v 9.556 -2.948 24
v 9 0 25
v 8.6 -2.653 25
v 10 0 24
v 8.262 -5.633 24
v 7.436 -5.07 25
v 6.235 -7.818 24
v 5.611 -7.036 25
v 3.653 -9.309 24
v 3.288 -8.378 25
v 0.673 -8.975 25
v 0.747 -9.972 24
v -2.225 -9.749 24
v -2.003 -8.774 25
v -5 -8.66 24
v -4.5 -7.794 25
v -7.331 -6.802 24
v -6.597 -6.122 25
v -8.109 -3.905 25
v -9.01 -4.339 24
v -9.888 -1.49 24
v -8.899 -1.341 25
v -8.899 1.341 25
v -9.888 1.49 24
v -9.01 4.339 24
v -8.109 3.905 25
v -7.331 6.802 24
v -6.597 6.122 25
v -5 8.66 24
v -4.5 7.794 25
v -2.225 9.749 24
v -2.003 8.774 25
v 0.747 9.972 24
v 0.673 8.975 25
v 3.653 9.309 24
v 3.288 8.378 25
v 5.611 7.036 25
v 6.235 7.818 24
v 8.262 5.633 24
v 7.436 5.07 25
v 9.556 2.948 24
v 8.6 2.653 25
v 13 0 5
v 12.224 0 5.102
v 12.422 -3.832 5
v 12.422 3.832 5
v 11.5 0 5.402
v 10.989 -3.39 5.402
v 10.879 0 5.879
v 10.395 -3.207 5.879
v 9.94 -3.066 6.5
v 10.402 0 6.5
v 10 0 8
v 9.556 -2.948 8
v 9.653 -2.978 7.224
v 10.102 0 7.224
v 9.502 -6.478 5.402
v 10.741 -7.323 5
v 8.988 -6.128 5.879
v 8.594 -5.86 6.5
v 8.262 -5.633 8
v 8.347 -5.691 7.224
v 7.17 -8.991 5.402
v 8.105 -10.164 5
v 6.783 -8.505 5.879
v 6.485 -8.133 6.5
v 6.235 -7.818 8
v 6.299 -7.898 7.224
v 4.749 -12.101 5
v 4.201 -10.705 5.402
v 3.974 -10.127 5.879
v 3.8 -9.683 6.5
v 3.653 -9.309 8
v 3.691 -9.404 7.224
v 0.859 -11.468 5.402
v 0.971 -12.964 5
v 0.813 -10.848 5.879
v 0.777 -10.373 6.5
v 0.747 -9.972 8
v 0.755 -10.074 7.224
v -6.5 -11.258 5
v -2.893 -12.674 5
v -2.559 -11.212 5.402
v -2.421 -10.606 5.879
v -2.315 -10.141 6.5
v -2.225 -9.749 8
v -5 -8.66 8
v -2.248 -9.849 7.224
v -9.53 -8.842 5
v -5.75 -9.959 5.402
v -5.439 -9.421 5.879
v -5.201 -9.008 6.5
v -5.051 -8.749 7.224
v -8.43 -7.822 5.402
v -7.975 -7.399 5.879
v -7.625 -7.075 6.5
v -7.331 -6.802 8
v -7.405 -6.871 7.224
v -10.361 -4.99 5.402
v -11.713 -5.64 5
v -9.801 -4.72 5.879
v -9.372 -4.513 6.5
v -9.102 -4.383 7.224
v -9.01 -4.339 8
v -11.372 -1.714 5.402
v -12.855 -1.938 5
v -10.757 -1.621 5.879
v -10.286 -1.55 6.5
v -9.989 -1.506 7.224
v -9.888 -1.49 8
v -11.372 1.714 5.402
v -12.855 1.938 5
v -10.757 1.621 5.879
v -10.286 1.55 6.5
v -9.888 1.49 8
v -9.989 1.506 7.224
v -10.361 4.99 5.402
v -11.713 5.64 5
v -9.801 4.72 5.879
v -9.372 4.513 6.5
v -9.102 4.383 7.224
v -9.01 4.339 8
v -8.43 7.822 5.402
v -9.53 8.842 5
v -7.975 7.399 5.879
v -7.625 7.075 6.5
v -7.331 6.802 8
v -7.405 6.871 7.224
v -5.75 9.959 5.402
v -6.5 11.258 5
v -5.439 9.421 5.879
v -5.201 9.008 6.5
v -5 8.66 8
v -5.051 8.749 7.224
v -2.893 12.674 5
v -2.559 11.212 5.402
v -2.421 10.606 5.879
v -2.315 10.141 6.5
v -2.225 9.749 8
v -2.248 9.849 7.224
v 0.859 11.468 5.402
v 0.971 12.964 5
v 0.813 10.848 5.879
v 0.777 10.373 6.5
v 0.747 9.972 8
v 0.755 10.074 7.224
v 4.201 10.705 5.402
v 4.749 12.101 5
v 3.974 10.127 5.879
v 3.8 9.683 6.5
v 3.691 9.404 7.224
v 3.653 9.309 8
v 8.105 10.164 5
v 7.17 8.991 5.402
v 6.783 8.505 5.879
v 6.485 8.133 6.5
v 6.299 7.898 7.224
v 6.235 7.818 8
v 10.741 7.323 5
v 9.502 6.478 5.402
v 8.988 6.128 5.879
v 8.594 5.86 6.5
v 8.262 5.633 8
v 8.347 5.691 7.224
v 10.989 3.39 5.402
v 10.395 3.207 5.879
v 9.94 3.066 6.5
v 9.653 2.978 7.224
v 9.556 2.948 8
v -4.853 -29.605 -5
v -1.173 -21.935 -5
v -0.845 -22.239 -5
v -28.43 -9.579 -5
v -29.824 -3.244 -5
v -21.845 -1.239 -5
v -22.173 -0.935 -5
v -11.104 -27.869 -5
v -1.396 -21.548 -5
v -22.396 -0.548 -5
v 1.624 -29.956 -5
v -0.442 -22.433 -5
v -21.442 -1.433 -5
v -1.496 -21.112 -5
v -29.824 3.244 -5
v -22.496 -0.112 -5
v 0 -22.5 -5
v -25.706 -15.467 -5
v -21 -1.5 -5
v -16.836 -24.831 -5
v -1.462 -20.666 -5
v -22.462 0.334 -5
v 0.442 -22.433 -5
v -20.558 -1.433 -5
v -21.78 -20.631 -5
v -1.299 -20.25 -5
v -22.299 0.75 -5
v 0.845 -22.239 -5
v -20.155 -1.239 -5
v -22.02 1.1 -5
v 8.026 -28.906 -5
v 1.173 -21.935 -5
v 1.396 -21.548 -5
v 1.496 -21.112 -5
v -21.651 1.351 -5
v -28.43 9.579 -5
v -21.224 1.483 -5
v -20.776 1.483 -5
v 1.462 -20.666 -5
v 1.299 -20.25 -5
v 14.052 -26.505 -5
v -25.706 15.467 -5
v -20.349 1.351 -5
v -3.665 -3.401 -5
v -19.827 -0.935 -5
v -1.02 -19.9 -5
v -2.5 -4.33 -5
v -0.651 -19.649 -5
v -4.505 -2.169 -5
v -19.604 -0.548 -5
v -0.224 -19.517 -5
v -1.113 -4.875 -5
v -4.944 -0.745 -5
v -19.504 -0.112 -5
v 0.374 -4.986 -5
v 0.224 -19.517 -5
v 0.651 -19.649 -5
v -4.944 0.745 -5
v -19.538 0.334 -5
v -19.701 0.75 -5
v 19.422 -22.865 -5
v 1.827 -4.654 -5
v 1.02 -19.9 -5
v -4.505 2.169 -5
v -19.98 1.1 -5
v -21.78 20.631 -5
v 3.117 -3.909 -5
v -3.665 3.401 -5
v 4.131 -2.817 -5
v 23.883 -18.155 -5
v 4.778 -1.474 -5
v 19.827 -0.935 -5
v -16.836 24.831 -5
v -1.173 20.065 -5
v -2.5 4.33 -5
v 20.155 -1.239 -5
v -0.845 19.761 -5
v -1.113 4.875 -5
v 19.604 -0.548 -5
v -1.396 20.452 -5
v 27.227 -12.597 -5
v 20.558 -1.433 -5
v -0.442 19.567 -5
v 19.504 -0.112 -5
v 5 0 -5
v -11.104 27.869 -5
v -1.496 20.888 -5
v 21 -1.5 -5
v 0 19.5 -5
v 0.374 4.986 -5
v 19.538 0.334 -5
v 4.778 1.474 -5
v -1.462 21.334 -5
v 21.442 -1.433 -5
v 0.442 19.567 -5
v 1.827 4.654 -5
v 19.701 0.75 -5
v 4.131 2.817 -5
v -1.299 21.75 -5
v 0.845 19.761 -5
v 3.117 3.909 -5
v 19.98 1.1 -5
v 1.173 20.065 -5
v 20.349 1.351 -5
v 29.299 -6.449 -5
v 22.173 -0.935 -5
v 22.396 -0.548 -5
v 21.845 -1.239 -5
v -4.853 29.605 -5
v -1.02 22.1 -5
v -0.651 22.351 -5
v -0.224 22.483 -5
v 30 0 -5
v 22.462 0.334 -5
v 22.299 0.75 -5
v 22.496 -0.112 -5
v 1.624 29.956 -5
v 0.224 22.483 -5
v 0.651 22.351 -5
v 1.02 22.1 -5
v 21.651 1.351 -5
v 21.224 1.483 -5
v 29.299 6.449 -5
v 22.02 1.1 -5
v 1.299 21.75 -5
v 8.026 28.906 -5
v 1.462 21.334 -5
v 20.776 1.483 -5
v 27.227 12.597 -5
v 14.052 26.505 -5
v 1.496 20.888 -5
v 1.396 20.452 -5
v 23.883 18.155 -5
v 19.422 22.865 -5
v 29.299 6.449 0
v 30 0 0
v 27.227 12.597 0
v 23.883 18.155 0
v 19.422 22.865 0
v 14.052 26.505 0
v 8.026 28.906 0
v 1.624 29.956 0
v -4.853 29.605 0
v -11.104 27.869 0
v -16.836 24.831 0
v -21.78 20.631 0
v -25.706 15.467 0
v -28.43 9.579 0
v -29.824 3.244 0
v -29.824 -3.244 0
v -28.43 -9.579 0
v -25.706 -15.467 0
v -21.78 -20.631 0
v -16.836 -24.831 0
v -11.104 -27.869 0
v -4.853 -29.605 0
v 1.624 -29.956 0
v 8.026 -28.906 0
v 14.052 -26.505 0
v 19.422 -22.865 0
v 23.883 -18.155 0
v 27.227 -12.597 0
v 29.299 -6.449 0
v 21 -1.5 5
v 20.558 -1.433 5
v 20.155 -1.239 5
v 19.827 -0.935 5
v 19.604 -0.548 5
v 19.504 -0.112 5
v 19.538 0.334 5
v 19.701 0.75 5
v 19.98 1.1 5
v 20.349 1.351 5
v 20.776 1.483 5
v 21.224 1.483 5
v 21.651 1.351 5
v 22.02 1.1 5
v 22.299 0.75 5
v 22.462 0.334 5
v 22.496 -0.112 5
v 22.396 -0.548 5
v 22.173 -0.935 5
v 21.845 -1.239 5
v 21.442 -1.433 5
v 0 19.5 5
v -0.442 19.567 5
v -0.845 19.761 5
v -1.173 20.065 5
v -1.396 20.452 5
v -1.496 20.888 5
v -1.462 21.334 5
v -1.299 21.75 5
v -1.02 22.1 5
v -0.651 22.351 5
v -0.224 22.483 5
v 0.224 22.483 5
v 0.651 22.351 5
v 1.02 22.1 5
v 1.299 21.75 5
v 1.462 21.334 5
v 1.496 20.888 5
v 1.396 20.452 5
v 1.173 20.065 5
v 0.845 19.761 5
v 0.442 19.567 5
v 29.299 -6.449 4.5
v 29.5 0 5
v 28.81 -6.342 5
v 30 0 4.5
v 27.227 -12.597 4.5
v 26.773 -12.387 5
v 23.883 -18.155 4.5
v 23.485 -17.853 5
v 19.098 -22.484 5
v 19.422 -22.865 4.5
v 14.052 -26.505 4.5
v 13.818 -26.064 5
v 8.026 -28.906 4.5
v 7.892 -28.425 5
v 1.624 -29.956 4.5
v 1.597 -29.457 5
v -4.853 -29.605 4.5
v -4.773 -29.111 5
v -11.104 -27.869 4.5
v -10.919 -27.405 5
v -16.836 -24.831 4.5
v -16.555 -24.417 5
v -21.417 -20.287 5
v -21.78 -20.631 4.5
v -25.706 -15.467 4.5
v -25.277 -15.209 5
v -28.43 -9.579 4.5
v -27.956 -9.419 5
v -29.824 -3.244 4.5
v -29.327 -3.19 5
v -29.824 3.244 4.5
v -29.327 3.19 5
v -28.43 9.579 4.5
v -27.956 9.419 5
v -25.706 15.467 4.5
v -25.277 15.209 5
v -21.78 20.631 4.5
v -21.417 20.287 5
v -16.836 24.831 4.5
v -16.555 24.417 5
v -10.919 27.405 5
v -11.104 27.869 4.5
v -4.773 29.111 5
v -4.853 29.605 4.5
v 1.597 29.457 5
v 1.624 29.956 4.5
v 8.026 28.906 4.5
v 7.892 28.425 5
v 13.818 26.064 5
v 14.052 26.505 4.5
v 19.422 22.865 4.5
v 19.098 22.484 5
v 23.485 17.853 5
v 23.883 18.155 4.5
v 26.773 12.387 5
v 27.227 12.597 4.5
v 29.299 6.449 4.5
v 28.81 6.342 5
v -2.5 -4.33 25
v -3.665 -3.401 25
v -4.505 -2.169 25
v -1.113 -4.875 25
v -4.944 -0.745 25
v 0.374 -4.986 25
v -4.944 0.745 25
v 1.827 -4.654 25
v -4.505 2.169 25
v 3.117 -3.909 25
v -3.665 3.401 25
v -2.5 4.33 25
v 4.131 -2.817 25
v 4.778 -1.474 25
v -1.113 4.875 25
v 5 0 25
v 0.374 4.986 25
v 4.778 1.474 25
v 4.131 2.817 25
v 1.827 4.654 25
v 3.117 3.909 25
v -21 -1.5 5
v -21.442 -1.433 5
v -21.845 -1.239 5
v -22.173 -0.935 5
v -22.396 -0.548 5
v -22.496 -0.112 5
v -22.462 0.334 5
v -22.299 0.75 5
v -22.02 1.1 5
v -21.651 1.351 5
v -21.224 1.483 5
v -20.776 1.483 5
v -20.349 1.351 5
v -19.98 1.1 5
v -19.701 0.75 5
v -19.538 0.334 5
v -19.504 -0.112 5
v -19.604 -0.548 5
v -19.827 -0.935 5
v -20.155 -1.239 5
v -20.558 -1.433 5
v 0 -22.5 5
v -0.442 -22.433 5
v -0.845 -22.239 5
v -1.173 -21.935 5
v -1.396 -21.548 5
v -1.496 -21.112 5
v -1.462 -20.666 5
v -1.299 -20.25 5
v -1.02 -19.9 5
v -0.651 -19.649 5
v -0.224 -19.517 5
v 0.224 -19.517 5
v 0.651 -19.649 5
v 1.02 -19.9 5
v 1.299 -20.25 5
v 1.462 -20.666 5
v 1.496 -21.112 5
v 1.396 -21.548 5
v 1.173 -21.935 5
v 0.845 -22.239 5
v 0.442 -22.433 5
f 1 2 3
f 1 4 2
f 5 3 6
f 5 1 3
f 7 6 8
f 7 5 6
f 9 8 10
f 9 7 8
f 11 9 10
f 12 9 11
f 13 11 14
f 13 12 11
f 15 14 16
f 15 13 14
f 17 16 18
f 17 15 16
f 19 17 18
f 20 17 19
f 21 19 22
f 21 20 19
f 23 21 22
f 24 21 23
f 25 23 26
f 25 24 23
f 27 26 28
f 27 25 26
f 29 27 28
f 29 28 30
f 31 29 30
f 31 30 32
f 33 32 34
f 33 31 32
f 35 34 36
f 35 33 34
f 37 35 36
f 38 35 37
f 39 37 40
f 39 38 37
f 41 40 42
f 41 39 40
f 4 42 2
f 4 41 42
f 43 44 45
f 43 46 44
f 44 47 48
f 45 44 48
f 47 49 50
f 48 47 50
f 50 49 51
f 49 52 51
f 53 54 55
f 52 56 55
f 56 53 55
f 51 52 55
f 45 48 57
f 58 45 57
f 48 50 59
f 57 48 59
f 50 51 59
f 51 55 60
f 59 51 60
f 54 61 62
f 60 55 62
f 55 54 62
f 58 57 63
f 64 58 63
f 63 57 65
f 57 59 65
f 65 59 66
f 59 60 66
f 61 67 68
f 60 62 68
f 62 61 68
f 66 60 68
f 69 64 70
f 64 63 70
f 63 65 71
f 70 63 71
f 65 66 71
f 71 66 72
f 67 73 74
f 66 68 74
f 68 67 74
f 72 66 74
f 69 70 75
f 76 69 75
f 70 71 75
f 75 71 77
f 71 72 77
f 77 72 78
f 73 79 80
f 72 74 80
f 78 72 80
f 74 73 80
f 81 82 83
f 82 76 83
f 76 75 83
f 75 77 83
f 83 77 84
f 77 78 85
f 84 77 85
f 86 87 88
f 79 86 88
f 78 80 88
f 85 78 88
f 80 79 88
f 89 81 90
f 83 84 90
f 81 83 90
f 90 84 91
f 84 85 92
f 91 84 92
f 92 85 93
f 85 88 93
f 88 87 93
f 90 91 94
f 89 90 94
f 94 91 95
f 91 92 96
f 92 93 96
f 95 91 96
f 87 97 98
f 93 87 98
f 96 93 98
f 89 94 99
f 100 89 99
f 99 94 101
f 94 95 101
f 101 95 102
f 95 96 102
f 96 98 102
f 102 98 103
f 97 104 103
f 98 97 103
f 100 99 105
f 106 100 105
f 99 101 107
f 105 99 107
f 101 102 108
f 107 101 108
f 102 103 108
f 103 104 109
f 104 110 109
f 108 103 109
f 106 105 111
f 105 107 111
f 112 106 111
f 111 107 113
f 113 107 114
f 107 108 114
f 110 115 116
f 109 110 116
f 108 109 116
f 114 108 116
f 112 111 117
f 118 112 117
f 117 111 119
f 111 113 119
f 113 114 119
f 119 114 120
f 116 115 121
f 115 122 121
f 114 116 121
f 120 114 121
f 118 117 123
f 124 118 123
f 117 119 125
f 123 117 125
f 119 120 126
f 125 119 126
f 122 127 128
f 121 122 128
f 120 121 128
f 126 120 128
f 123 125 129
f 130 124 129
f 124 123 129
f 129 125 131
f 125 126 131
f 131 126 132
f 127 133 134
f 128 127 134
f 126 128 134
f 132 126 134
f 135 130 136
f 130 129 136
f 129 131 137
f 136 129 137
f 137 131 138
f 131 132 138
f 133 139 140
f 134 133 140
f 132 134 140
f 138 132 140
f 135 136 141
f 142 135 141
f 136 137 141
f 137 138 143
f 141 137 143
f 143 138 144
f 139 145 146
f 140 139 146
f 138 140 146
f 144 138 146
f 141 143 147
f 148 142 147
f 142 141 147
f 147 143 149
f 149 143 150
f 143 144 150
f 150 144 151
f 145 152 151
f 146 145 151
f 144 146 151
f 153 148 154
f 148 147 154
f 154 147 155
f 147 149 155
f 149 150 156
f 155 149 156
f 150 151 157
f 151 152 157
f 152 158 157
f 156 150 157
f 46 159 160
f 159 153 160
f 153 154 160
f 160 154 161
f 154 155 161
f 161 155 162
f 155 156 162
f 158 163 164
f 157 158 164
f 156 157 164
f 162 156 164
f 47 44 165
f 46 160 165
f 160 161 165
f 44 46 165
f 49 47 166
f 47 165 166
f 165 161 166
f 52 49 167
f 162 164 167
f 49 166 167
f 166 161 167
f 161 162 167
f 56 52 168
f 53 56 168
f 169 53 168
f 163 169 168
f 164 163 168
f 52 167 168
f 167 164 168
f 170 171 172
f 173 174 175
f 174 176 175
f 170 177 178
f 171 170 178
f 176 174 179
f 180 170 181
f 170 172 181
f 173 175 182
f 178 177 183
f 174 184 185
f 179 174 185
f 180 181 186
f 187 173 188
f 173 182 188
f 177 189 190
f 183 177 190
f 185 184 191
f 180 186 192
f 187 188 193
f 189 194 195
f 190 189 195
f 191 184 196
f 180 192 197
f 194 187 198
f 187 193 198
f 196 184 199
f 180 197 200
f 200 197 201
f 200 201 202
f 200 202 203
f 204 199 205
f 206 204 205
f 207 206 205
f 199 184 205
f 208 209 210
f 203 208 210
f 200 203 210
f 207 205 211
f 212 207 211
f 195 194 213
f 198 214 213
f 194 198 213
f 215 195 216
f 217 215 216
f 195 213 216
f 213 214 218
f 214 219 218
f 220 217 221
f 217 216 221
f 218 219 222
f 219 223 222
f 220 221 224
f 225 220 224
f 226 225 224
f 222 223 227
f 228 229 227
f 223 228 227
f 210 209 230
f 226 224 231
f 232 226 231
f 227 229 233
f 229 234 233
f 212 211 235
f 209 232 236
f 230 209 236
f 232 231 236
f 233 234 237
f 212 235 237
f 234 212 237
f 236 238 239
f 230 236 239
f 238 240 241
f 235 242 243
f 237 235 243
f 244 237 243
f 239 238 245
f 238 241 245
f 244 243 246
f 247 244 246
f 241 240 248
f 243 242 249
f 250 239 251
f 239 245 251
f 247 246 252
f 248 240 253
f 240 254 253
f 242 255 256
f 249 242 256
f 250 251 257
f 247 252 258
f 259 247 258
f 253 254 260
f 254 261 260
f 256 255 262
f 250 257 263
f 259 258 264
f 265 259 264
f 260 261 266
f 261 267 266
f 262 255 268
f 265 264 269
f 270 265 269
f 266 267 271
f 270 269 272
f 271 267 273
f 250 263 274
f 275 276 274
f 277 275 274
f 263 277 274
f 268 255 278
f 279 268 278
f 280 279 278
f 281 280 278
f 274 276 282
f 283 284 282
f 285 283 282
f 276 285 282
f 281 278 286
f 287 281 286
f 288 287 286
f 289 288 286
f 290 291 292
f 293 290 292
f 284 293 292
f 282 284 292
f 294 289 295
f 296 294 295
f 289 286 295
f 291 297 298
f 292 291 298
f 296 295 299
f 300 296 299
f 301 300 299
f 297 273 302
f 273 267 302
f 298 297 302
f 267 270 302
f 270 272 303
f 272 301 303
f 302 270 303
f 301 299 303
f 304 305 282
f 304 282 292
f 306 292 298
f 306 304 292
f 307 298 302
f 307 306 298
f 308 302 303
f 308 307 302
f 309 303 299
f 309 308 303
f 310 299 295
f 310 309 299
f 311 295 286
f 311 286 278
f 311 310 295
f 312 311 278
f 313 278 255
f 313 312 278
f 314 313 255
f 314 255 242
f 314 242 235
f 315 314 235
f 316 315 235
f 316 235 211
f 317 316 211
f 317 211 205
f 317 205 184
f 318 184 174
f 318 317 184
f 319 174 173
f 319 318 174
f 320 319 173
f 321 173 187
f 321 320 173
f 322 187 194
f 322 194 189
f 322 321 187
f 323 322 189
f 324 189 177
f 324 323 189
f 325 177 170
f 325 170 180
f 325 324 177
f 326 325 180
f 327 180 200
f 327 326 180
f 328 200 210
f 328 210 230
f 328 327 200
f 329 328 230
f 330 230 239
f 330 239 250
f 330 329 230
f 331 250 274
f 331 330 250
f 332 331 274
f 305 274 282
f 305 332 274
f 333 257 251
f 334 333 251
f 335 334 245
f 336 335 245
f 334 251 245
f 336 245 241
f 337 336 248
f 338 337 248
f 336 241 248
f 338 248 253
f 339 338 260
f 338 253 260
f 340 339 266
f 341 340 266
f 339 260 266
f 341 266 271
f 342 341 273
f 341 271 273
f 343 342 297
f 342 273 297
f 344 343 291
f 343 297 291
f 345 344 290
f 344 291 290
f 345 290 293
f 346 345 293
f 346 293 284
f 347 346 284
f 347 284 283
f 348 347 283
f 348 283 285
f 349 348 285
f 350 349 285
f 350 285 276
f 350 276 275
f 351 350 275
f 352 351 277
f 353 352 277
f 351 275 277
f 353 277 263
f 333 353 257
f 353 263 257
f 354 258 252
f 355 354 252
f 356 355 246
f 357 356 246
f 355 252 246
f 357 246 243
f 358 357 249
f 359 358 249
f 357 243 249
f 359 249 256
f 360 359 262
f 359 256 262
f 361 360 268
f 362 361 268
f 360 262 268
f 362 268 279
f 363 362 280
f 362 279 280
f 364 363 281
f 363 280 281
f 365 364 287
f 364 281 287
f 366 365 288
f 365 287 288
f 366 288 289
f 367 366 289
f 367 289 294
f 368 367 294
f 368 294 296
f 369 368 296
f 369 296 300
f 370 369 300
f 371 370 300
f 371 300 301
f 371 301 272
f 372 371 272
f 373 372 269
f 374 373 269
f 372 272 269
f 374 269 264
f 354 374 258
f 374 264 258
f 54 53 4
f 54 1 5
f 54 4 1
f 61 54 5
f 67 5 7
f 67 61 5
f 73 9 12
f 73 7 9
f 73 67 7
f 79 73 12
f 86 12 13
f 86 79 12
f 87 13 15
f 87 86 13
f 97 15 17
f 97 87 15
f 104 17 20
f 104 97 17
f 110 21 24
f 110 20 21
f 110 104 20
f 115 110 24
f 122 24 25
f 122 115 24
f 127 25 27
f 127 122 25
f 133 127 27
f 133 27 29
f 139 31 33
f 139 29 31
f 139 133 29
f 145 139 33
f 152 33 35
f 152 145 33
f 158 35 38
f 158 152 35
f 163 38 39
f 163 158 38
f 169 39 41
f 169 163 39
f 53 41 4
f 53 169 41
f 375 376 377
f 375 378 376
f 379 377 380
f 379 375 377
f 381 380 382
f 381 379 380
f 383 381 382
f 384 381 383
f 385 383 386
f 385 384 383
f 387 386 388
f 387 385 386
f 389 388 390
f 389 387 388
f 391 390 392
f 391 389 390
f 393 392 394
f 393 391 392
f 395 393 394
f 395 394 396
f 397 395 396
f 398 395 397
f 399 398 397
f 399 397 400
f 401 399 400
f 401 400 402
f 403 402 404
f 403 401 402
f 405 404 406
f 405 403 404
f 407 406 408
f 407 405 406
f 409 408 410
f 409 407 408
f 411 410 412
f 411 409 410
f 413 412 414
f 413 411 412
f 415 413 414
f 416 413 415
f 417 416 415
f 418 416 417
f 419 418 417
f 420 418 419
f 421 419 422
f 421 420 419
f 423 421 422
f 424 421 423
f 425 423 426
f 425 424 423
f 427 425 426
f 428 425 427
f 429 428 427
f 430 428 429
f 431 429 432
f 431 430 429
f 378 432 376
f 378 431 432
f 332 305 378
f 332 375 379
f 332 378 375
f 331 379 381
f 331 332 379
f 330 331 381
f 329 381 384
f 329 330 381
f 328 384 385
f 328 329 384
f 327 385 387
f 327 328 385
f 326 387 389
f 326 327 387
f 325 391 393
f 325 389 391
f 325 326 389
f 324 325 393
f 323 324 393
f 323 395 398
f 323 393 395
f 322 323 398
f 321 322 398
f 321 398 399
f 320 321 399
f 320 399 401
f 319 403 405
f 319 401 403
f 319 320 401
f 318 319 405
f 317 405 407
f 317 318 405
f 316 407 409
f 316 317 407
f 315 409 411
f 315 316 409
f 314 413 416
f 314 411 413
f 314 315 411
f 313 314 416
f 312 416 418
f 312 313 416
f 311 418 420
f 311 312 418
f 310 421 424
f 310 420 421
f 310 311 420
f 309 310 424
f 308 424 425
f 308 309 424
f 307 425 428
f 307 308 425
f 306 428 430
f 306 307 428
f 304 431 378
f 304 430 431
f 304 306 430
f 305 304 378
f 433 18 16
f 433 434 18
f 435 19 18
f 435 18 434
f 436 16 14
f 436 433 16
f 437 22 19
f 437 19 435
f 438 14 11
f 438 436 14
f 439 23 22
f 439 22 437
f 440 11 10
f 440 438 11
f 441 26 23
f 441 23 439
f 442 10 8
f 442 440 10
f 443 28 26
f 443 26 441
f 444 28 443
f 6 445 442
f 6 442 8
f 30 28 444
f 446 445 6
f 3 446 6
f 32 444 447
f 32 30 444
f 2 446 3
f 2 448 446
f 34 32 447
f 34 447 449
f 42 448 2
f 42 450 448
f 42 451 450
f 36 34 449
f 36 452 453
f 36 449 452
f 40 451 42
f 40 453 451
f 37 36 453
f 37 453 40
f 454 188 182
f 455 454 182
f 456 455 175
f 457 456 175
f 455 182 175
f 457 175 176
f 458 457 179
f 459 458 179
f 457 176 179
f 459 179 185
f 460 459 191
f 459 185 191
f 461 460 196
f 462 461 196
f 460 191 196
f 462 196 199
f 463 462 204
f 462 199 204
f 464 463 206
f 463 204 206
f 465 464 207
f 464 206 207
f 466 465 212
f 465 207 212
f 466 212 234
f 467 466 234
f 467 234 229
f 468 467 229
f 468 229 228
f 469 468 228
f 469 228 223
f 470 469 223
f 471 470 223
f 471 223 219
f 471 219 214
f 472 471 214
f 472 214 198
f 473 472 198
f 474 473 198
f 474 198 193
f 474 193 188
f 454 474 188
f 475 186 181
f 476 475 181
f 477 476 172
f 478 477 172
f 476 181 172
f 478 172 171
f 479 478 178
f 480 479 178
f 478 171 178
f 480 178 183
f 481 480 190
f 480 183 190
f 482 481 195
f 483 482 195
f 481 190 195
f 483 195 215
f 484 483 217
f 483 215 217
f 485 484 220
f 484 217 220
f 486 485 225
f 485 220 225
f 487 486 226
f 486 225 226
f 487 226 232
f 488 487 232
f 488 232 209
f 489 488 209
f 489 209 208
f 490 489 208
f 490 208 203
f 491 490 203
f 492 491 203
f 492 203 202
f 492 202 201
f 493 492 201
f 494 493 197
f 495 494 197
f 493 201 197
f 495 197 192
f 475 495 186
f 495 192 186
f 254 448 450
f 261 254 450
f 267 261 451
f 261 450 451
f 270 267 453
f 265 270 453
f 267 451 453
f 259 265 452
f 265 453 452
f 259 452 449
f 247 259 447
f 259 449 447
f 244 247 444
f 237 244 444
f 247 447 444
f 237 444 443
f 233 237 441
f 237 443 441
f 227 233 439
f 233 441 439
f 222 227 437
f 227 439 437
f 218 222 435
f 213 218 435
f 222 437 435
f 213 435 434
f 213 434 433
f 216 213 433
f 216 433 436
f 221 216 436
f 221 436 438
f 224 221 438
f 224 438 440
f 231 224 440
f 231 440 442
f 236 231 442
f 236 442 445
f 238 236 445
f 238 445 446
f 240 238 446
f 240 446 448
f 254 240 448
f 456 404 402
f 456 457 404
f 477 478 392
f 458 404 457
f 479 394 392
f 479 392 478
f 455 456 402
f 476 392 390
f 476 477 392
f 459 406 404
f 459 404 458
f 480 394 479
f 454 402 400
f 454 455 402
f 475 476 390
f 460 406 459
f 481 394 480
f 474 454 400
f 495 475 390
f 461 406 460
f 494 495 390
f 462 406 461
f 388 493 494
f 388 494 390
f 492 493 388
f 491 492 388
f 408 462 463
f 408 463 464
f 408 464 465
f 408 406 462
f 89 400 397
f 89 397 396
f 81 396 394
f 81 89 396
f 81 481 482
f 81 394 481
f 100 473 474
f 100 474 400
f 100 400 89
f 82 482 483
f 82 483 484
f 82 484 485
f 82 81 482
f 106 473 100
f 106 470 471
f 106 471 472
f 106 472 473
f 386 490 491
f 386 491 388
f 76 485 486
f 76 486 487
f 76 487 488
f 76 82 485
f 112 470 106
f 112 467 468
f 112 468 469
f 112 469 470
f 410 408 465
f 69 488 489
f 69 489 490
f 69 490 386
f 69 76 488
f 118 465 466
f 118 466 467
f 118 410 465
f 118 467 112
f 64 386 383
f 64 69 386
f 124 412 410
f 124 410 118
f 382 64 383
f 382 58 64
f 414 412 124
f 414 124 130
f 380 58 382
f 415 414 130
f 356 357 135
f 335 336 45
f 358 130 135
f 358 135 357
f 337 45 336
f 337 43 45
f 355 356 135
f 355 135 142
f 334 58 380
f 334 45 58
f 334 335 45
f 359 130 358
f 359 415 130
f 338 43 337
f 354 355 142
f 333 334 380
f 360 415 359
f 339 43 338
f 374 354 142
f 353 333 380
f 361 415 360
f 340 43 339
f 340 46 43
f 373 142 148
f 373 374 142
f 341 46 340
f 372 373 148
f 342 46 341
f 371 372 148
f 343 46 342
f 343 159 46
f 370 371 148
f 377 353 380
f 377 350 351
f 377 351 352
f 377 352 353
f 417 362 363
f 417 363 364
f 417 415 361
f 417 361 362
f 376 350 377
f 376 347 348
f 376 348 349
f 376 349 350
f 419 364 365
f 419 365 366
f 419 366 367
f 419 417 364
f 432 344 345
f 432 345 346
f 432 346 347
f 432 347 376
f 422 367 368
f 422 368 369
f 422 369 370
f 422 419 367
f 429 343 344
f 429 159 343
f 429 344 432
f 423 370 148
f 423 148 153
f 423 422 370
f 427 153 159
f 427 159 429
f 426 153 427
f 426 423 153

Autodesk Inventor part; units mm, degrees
ref_plane "YZ Plane" through (0, 0, 0) normal (1, 0, 0) x (0, 1, 0)
ref_plane "XZ Plane" through (0, 0, 0) normal (0, 1, 0) x (-1, 0, 0)
ref_plane "XY Plane" through (0, 0, 0) normal (0, 0, 1) x (1, 0, 0)
sketch "Sketch1" plane through (0, 0, 0) normal (0, 0, 1) x (1, 0, 0)
  circle A0 centre (0, 0) radius 30
  dimension "d0" = 60
extrude "Extrusion1" add sketch "Sketch1" along normal mid plane 10
sketch "Sketch2" plane through (0, 0, 5) normal (0, 0, 1) x (1, 0, 0)
  circle A0 centre (0, 0) radius 30 projected
  circle A1 centre (0, 0) radius 10
  dimension "d3" = 20
extrude "Extrusion2" add sketch "Sketch2" along normal blind 20 contours A1
sketch "Sketch3" plane through (0, 0, 25) normal (0, 0, 1) x (1, 0, 0)
  circle A0 centre (0, 0) radius 10 projected
  circle A1 centre (0, 0) radius 5
  dimension "d6" = 10
extrude "Extrusion3" cut sketch "Sketch3" against normal through all contours A1
fillet "Fillet1" radius 3 1 edges at (-10, 0, 5)
chamfer "Chamfer1" distance 1 angle 45 1 edges at (-10, 0, 25)
sketch "Sketch5" plane through (0, 0, 5) normal (0, 0, 1) x (1, 0, 0)
  circle A0 centre (0, 0) radius 30 projected
  circle A1 centre (0, 0) radius 5 projected
  point P0 (-21, 0)
  point P1 (21, 0)
  point P2 (0, 21)
  point P3 (0, -21)
  dimension "d14" = 21
  dimension "d15" = 21
  dimension "d16" = 21
  dimension "d17" = 21
hole "Hole1" at (-21, 0, 5) at (21, 0, 5) at (0, 21, 5) at (0, -21, 5) direction (0, 0, -1) diameter 3 end through all
chamfer "Chamfer2" distance 0.5 angle 45 1 edges at (-30, 0, 5)
properties part number "relation"
